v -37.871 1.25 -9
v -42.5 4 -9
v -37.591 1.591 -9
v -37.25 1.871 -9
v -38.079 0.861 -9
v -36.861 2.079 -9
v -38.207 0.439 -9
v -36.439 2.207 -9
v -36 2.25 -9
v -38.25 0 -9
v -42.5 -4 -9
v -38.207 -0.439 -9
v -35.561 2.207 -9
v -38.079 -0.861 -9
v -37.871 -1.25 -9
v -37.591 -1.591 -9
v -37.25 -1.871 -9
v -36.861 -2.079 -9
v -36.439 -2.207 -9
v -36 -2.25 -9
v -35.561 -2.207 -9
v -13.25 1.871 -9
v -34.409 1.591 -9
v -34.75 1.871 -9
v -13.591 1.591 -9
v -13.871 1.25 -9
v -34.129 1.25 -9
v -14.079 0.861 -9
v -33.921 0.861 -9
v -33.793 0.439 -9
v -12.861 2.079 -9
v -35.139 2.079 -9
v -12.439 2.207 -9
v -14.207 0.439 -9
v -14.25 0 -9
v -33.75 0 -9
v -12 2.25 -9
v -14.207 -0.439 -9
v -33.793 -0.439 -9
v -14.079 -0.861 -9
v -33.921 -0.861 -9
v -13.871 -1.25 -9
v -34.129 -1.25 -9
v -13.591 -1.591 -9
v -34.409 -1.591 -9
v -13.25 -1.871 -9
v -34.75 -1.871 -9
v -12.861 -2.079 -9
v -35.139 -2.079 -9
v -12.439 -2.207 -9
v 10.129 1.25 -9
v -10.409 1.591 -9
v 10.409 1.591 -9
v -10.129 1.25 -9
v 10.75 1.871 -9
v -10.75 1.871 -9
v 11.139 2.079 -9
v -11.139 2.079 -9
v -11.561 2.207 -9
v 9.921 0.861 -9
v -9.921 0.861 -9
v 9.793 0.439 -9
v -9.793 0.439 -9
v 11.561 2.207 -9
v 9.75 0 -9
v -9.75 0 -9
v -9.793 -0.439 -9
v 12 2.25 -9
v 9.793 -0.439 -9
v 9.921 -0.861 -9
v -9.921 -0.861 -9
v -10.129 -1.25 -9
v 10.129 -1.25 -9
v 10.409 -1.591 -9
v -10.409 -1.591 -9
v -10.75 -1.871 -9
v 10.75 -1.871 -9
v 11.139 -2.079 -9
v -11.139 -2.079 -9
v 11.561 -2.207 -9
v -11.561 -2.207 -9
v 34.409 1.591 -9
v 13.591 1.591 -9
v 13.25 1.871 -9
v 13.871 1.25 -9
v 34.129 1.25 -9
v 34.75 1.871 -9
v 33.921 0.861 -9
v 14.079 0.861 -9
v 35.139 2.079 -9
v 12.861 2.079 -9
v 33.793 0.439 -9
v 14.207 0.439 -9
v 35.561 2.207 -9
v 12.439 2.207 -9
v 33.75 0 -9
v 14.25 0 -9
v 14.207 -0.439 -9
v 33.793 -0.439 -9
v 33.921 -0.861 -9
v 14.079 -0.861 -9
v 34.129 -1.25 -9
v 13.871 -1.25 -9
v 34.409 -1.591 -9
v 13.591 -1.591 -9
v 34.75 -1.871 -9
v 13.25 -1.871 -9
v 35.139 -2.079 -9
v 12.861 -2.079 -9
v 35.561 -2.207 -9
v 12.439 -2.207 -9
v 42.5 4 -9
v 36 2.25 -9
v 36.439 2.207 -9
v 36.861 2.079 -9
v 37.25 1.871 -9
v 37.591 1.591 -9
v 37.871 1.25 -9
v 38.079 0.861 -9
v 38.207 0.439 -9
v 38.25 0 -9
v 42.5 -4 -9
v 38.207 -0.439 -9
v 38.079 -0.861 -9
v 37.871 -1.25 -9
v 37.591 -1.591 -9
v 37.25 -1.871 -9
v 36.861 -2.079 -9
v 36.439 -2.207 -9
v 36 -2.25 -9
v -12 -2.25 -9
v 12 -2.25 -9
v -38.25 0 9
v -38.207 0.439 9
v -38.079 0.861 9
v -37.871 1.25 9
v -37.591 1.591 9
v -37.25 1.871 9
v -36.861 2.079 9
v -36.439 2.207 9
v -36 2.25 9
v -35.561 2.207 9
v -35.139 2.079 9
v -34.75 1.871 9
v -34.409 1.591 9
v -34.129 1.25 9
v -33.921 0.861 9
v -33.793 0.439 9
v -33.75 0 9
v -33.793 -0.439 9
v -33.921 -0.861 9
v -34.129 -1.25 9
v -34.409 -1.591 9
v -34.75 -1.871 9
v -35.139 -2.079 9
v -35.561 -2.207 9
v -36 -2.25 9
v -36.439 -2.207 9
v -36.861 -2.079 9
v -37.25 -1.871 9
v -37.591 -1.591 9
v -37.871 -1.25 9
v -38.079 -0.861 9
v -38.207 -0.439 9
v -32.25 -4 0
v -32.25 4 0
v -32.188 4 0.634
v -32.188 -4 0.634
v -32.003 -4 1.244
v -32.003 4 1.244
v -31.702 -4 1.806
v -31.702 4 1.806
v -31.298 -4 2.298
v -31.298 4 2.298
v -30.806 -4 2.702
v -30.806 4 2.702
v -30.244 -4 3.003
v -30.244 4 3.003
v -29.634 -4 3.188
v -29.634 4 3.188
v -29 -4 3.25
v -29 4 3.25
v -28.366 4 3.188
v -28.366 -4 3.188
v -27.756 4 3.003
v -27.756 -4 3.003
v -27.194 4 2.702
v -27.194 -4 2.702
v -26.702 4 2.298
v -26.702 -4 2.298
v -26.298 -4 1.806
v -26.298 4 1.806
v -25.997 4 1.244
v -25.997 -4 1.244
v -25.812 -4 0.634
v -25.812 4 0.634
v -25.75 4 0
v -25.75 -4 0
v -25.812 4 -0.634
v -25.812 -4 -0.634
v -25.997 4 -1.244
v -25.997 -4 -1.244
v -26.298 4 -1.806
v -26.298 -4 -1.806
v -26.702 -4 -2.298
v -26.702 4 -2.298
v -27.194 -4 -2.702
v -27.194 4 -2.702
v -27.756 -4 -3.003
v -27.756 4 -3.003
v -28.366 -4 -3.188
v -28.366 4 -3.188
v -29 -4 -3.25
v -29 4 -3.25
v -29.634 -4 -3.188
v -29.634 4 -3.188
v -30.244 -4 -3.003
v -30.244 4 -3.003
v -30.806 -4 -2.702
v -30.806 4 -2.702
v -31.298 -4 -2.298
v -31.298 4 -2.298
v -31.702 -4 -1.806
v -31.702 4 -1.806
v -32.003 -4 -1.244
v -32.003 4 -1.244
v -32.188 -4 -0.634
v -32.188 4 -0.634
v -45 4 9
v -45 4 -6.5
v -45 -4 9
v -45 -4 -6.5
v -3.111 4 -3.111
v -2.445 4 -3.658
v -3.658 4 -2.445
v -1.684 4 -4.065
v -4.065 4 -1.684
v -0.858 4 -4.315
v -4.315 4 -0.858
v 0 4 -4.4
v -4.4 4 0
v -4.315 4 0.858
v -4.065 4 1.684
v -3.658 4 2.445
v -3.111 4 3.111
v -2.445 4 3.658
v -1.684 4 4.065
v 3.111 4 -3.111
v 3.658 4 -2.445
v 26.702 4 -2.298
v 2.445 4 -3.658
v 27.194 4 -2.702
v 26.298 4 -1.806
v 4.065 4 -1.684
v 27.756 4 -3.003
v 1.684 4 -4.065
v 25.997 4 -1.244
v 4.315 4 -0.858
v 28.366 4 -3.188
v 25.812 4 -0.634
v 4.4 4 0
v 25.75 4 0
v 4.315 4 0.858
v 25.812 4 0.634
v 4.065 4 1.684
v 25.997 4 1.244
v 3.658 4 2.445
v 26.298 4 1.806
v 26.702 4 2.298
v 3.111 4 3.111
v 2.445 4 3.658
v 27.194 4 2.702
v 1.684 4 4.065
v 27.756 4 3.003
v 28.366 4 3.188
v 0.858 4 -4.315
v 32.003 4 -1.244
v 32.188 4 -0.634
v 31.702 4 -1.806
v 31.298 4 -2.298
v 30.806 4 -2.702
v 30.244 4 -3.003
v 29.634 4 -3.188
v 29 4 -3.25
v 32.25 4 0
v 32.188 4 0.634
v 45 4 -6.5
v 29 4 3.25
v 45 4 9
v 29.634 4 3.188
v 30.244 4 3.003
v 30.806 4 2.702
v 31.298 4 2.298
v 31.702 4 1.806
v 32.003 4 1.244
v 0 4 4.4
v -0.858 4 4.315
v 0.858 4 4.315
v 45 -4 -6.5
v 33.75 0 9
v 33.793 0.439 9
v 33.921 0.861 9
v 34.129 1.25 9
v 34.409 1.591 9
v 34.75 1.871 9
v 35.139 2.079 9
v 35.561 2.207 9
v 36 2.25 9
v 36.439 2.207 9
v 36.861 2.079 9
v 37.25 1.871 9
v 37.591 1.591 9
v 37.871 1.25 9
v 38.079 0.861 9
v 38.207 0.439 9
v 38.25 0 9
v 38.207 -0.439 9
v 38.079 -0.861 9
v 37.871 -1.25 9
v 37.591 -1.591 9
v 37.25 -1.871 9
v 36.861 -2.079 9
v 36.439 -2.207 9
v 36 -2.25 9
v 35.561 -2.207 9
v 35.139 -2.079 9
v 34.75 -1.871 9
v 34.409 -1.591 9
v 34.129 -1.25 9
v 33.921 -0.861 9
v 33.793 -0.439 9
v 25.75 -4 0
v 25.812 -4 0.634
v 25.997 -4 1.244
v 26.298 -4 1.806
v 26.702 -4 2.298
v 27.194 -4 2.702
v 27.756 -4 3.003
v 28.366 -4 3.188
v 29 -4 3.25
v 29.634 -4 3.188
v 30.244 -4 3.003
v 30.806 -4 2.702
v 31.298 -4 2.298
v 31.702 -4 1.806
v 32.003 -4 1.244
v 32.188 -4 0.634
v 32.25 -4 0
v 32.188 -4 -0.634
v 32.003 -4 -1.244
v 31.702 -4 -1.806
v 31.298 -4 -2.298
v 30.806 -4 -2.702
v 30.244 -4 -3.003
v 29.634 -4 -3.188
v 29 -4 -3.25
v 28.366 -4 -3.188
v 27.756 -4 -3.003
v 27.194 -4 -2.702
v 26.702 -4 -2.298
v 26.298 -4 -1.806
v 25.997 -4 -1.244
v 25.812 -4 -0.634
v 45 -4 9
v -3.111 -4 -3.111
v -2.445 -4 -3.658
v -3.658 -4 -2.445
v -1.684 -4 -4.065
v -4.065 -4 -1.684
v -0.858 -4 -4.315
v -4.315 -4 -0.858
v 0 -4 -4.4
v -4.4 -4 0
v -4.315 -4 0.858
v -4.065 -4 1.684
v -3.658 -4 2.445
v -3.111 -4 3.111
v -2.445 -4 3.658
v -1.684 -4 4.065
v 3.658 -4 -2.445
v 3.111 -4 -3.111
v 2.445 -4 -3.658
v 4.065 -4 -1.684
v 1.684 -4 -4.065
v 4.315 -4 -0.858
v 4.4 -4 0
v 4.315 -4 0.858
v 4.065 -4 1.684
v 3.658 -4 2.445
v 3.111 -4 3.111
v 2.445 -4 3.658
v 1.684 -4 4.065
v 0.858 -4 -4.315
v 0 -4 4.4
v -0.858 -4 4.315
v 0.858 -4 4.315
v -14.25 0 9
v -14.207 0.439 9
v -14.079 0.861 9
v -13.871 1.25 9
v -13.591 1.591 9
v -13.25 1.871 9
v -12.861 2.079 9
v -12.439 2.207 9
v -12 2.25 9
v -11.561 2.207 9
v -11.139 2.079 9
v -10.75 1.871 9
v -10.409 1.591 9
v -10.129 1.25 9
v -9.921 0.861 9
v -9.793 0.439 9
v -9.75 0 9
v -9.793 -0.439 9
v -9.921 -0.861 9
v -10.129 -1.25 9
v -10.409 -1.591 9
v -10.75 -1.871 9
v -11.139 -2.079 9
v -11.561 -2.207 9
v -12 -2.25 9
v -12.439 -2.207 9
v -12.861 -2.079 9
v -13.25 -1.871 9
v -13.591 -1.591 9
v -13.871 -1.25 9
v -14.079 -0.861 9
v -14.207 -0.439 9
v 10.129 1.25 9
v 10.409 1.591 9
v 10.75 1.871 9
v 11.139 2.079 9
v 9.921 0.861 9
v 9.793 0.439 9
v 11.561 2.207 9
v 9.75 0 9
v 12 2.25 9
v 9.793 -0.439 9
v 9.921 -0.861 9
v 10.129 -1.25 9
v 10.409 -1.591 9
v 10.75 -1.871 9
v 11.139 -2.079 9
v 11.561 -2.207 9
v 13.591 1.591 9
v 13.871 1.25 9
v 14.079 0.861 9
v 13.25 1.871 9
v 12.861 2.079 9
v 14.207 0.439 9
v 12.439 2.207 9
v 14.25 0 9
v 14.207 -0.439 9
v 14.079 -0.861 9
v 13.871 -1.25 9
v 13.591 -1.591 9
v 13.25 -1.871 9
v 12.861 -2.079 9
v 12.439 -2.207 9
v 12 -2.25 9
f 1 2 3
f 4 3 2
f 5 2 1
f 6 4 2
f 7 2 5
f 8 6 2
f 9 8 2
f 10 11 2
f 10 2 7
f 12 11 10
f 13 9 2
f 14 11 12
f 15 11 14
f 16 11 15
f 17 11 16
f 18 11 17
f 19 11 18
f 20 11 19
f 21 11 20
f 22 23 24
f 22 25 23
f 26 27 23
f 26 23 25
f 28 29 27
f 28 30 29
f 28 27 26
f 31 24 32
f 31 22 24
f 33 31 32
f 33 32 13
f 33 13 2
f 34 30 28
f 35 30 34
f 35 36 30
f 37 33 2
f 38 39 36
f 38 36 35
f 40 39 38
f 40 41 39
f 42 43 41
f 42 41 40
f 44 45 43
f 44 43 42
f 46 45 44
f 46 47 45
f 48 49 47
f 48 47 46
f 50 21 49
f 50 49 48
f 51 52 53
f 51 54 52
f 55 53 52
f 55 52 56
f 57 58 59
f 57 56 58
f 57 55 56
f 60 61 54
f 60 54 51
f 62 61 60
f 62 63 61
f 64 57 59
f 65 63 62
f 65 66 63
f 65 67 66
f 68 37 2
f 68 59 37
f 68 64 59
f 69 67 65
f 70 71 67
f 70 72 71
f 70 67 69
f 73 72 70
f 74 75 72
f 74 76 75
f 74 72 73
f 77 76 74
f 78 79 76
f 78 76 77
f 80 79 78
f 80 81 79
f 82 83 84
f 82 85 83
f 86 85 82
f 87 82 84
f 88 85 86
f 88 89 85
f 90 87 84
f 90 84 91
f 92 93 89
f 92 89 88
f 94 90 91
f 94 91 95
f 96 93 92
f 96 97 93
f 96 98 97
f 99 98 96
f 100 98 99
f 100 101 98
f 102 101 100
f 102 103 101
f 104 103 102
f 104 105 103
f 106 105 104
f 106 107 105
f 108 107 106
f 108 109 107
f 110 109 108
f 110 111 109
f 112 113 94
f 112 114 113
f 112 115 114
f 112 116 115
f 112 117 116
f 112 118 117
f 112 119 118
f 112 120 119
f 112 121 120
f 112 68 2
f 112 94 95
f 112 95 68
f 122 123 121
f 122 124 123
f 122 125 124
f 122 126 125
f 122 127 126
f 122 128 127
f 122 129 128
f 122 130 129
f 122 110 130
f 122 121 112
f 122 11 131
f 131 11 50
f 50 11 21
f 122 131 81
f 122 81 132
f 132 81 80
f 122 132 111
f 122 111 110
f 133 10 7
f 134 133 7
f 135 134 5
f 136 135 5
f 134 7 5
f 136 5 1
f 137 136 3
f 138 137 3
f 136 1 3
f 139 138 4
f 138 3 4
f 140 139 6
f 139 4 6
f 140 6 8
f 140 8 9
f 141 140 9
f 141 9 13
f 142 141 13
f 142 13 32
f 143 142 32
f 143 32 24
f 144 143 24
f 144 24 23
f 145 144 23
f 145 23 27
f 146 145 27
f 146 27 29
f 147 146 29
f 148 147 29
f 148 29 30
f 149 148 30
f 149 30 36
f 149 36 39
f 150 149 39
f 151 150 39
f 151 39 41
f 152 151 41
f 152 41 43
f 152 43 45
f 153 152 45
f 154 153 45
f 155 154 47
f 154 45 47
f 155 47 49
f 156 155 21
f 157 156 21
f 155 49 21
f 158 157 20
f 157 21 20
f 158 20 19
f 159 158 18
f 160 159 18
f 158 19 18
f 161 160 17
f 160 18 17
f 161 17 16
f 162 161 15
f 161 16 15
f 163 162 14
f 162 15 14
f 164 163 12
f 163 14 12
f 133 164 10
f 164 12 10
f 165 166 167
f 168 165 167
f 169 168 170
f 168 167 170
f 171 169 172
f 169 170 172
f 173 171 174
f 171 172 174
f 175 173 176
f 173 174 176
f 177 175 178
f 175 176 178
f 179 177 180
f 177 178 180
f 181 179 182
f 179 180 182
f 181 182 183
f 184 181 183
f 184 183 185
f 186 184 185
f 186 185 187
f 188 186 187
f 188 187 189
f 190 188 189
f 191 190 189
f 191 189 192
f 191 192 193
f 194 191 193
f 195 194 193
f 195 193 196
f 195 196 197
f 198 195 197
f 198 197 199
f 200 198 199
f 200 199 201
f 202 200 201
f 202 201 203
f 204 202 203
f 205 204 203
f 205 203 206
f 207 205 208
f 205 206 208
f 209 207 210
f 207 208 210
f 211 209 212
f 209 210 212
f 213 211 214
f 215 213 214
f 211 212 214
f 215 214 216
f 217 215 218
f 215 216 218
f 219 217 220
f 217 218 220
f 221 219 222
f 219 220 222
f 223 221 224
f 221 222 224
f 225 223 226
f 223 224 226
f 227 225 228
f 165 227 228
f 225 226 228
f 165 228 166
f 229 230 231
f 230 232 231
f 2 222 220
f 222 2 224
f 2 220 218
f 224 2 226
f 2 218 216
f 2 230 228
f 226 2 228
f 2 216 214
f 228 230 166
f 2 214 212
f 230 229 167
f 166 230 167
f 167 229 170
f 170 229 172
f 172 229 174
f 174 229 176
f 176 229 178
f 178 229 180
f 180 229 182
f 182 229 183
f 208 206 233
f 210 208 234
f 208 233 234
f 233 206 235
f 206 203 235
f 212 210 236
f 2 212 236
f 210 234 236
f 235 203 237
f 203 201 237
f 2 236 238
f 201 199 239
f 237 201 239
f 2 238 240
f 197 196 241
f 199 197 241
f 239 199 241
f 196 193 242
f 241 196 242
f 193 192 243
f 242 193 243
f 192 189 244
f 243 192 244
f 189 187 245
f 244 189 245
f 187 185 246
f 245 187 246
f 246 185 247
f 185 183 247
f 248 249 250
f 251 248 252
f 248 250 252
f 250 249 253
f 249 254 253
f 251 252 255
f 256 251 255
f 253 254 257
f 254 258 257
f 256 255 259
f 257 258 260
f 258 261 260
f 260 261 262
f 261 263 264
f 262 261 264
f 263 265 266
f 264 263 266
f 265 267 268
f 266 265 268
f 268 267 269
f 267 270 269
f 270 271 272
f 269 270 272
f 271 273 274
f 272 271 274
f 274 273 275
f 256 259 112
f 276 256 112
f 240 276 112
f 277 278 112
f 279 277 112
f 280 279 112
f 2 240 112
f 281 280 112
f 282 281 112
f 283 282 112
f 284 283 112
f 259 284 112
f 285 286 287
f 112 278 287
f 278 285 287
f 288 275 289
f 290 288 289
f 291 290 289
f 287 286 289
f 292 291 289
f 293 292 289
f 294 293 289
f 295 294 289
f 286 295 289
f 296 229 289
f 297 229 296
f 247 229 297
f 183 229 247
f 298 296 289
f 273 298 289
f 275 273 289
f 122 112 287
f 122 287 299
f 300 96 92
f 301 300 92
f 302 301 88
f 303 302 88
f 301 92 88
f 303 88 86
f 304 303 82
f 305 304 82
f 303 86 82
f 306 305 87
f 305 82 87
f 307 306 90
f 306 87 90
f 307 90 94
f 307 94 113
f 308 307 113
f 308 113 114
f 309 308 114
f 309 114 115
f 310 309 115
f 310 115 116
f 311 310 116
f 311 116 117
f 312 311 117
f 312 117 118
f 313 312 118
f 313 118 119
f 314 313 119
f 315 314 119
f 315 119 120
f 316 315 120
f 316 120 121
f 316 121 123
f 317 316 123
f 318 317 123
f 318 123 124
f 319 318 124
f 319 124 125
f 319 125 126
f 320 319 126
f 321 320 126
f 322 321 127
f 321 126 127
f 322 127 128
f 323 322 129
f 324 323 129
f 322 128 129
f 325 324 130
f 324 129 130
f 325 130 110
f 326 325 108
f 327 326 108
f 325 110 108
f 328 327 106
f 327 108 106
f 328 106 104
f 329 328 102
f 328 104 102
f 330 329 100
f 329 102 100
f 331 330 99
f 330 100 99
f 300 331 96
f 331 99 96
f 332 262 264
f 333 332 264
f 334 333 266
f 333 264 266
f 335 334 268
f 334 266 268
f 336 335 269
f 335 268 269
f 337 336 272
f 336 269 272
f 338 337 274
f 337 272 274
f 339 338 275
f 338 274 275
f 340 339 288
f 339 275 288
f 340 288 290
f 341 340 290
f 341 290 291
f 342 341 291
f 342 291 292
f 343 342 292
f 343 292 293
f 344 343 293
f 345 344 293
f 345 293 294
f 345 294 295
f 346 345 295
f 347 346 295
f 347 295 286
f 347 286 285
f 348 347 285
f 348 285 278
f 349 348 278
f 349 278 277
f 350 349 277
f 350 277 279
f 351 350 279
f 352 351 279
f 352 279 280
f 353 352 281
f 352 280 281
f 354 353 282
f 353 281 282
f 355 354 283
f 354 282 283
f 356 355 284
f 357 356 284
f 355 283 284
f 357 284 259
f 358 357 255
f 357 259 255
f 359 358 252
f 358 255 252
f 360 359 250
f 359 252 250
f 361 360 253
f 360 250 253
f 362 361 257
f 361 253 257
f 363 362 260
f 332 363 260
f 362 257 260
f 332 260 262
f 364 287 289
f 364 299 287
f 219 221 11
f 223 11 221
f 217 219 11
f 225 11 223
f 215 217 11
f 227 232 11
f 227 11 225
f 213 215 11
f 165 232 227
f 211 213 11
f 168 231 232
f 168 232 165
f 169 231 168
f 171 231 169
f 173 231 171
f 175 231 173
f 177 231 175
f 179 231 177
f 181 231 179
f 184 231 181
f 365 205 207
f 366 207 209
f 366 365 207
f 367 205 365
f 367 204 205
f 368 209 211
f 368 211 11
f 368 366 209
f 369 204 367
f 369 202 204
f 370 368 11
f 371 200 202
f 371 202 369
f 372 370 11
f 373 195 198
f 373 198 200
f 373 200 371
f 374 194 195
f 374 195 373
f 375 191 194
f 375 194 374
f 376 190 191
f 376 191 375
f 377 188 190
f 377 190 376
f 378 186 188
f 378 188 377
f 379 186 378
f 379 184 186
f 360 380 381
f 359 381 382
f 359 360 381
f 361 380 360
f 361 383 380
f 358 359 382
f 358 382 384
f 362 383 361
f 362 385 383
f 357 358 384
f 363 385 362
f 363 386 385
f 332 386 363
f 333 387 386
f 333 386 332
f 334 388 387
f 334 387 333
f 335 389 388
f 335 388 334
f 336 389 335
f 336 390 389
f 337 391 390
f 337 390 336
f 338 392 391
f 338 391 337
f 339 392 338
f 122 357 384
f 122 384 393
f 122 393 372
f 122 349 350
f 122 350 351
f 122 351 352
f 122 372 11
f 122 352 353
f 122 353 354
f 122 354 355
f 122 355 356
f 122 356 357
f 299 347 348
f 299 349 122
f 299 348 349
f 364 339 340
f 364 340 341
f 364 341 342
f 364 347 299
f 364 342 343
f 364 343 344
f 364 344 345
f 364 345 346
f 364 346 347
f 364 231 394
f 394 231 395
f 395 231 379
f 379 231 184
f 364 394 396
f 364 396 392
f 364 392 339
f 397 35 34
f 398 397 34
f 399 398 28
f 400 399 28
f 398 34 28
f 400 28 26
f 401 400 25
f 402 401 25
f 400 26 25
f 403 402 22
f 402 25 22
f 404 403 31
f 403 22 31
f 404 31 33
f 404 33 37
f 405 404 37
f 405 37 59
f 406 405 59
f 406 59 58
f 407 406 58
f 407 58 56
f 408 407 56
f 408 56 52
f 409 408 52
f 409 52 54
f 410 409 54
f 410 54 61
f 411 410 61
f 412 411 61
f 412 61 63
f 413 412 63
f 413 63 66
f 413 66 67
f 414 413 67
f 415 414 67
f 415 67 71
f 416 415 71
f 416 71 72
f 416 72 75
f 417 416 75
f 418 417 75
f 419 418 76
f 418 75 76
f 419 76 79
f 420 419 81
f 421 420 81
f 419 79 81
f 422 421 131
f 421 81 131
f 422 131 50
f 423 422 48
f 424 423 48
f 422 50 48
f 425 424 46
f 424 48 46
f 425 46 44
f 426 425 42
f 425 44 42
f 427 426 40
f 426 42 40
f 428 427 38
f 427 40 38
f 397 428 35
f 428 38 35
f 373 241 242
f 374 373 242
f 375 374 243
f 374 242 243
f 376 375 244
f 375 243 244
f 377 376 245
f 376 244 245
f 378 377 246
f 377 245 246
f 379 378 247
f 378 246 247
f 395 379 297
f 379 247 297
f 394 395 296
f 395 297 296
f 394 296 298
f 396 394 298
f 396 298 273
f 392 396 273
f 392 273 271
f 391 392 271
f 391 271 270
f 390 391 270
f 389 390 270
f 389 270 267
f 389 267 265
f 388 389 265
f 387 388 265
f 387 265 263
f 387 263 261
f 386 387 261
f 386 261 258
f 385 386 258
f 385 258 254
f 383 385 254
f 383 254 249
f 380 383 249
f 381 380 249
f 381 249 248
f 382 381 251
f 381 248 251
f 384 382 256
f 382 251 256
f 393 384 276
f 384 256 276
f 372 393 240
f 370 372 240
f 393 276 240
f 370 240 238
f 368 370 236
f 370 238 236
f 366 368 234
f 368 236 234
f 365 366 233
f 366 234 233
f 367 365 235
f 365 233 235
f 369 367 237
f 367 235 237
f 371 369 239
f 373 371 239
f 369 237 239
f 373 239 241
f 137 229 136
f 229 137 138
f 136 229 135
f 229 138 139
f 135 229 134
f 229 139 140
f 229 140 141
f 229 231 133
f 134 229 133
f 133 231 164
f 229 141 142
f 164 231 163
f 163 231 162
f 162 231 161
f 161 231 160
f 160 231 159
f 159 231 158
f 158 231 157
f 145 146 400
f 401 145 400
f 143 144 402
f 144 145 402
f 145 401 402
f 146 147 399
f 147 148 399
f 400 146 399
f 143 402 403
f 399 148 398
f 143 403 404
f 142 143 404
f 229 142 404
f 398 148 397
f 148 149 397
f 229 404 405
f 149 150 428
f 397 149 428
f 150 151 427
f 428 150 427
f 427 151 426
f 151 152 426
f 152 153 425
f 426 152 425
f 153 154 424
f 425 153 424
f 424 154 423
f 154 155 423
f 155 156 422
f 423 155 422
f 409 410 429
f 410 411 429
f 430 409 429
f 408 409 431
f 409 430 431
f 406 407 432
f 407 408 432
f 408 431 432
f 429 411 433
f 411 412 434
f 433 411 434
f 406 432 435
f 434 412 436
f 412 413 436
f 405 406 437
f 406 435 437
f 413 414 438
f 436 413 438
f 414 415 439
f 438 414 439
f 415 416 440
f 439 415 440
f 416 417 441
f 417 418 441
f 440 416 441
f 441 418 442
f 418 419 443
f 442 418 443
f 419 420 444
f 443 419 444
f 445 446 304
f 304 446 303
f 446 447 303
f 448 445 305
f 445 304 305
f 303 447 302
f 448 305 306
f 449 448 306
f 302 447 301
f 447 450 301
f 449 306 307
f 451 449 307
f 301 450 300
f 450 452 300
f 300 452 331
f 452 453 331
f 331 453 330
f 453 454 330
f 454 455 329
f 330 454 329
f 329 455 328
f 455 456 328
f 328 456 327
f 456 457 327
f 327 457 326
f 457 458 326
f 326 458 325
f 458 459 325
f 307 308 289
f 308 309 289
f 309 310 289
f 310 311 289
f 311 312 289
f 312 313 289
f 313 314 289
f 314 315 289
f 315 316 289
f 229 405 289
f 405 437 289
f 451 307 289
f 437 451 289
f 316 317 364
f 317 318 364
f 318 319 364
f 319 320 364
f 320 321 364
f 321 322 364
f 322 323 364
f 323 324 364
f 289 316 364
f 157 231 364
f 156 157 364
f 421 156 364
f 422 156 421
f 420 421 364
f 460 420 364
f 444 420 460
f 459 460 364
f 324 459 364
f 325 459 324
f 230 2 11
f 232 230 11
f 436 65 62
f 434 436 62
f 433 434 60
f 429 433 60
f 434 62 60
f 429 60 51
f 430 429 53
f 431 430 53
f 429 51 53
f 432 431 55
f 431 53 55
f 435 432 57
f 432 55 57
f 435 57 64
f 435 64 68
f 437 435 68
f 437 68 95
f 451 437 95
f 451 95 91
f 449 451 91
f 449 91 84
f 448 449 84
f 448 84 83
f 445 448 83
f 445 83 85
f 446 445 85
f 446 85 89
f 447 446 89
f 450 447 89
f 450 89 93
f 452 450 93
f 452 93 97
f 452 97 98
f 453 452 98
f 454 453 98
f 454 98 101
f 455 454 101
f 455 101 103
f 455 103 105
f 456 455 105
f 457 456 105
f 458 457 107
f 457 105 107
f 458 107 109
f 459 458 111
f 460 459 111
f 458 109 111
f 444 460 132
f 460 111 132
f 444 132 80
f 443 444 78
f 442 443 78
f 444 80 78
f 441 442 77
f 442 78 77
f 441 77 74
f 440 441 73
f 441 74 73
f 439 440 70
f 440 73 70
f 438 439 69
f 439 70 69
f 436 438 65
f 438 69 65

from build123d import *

# Parameters (mm, degrees)
F0_W          = 90
F0_H          = 18
F1_DEPTH      = 4
F1_DEPTH_BACK = 4
F2_SIZE       = 2.5
F4_D          = 6.5
F5_D          = 8.8
F7_D          = 4.5


with BuildPart() as f1:
    # F0 (on Front) → F1 (new body, two sides)
    with BuildSketch(Plane.XZ) as f1_sk:
        Rectangle(F0_W, F0_H)
    extrude(amount=F1_DEPTH)
    extrude(f1_sk.sketch, amount=-F1_DEPTH_BACK)

    # F2
    f2_edges = [f1.edges().sort_by_distance(p)[0] for p in [
        (-45, 0, -9),
        (45, 0, -9),
    ]]
    chamfer(f2_edges, length=F2_SIZE)

    # F4 (through all)
    with Locations(Plane.XZ.offset(4)):
        with Locations((-29, 0), (29, 0)):
            Hole(F4_D / 2)

    # F5 (through all)
    with Locations(Plane.XZ.offset(4)):
        with Locations((0, 0)):
            Hole(F5_D / 2)

    # F7 (through all)
    with Locations(Plane.XY.offset(9)):
        with Locations((-36, 0), (-12, 0), (12, 0), (36, 0)):
            Hole(F7_D / 2)


solid = f1.part
